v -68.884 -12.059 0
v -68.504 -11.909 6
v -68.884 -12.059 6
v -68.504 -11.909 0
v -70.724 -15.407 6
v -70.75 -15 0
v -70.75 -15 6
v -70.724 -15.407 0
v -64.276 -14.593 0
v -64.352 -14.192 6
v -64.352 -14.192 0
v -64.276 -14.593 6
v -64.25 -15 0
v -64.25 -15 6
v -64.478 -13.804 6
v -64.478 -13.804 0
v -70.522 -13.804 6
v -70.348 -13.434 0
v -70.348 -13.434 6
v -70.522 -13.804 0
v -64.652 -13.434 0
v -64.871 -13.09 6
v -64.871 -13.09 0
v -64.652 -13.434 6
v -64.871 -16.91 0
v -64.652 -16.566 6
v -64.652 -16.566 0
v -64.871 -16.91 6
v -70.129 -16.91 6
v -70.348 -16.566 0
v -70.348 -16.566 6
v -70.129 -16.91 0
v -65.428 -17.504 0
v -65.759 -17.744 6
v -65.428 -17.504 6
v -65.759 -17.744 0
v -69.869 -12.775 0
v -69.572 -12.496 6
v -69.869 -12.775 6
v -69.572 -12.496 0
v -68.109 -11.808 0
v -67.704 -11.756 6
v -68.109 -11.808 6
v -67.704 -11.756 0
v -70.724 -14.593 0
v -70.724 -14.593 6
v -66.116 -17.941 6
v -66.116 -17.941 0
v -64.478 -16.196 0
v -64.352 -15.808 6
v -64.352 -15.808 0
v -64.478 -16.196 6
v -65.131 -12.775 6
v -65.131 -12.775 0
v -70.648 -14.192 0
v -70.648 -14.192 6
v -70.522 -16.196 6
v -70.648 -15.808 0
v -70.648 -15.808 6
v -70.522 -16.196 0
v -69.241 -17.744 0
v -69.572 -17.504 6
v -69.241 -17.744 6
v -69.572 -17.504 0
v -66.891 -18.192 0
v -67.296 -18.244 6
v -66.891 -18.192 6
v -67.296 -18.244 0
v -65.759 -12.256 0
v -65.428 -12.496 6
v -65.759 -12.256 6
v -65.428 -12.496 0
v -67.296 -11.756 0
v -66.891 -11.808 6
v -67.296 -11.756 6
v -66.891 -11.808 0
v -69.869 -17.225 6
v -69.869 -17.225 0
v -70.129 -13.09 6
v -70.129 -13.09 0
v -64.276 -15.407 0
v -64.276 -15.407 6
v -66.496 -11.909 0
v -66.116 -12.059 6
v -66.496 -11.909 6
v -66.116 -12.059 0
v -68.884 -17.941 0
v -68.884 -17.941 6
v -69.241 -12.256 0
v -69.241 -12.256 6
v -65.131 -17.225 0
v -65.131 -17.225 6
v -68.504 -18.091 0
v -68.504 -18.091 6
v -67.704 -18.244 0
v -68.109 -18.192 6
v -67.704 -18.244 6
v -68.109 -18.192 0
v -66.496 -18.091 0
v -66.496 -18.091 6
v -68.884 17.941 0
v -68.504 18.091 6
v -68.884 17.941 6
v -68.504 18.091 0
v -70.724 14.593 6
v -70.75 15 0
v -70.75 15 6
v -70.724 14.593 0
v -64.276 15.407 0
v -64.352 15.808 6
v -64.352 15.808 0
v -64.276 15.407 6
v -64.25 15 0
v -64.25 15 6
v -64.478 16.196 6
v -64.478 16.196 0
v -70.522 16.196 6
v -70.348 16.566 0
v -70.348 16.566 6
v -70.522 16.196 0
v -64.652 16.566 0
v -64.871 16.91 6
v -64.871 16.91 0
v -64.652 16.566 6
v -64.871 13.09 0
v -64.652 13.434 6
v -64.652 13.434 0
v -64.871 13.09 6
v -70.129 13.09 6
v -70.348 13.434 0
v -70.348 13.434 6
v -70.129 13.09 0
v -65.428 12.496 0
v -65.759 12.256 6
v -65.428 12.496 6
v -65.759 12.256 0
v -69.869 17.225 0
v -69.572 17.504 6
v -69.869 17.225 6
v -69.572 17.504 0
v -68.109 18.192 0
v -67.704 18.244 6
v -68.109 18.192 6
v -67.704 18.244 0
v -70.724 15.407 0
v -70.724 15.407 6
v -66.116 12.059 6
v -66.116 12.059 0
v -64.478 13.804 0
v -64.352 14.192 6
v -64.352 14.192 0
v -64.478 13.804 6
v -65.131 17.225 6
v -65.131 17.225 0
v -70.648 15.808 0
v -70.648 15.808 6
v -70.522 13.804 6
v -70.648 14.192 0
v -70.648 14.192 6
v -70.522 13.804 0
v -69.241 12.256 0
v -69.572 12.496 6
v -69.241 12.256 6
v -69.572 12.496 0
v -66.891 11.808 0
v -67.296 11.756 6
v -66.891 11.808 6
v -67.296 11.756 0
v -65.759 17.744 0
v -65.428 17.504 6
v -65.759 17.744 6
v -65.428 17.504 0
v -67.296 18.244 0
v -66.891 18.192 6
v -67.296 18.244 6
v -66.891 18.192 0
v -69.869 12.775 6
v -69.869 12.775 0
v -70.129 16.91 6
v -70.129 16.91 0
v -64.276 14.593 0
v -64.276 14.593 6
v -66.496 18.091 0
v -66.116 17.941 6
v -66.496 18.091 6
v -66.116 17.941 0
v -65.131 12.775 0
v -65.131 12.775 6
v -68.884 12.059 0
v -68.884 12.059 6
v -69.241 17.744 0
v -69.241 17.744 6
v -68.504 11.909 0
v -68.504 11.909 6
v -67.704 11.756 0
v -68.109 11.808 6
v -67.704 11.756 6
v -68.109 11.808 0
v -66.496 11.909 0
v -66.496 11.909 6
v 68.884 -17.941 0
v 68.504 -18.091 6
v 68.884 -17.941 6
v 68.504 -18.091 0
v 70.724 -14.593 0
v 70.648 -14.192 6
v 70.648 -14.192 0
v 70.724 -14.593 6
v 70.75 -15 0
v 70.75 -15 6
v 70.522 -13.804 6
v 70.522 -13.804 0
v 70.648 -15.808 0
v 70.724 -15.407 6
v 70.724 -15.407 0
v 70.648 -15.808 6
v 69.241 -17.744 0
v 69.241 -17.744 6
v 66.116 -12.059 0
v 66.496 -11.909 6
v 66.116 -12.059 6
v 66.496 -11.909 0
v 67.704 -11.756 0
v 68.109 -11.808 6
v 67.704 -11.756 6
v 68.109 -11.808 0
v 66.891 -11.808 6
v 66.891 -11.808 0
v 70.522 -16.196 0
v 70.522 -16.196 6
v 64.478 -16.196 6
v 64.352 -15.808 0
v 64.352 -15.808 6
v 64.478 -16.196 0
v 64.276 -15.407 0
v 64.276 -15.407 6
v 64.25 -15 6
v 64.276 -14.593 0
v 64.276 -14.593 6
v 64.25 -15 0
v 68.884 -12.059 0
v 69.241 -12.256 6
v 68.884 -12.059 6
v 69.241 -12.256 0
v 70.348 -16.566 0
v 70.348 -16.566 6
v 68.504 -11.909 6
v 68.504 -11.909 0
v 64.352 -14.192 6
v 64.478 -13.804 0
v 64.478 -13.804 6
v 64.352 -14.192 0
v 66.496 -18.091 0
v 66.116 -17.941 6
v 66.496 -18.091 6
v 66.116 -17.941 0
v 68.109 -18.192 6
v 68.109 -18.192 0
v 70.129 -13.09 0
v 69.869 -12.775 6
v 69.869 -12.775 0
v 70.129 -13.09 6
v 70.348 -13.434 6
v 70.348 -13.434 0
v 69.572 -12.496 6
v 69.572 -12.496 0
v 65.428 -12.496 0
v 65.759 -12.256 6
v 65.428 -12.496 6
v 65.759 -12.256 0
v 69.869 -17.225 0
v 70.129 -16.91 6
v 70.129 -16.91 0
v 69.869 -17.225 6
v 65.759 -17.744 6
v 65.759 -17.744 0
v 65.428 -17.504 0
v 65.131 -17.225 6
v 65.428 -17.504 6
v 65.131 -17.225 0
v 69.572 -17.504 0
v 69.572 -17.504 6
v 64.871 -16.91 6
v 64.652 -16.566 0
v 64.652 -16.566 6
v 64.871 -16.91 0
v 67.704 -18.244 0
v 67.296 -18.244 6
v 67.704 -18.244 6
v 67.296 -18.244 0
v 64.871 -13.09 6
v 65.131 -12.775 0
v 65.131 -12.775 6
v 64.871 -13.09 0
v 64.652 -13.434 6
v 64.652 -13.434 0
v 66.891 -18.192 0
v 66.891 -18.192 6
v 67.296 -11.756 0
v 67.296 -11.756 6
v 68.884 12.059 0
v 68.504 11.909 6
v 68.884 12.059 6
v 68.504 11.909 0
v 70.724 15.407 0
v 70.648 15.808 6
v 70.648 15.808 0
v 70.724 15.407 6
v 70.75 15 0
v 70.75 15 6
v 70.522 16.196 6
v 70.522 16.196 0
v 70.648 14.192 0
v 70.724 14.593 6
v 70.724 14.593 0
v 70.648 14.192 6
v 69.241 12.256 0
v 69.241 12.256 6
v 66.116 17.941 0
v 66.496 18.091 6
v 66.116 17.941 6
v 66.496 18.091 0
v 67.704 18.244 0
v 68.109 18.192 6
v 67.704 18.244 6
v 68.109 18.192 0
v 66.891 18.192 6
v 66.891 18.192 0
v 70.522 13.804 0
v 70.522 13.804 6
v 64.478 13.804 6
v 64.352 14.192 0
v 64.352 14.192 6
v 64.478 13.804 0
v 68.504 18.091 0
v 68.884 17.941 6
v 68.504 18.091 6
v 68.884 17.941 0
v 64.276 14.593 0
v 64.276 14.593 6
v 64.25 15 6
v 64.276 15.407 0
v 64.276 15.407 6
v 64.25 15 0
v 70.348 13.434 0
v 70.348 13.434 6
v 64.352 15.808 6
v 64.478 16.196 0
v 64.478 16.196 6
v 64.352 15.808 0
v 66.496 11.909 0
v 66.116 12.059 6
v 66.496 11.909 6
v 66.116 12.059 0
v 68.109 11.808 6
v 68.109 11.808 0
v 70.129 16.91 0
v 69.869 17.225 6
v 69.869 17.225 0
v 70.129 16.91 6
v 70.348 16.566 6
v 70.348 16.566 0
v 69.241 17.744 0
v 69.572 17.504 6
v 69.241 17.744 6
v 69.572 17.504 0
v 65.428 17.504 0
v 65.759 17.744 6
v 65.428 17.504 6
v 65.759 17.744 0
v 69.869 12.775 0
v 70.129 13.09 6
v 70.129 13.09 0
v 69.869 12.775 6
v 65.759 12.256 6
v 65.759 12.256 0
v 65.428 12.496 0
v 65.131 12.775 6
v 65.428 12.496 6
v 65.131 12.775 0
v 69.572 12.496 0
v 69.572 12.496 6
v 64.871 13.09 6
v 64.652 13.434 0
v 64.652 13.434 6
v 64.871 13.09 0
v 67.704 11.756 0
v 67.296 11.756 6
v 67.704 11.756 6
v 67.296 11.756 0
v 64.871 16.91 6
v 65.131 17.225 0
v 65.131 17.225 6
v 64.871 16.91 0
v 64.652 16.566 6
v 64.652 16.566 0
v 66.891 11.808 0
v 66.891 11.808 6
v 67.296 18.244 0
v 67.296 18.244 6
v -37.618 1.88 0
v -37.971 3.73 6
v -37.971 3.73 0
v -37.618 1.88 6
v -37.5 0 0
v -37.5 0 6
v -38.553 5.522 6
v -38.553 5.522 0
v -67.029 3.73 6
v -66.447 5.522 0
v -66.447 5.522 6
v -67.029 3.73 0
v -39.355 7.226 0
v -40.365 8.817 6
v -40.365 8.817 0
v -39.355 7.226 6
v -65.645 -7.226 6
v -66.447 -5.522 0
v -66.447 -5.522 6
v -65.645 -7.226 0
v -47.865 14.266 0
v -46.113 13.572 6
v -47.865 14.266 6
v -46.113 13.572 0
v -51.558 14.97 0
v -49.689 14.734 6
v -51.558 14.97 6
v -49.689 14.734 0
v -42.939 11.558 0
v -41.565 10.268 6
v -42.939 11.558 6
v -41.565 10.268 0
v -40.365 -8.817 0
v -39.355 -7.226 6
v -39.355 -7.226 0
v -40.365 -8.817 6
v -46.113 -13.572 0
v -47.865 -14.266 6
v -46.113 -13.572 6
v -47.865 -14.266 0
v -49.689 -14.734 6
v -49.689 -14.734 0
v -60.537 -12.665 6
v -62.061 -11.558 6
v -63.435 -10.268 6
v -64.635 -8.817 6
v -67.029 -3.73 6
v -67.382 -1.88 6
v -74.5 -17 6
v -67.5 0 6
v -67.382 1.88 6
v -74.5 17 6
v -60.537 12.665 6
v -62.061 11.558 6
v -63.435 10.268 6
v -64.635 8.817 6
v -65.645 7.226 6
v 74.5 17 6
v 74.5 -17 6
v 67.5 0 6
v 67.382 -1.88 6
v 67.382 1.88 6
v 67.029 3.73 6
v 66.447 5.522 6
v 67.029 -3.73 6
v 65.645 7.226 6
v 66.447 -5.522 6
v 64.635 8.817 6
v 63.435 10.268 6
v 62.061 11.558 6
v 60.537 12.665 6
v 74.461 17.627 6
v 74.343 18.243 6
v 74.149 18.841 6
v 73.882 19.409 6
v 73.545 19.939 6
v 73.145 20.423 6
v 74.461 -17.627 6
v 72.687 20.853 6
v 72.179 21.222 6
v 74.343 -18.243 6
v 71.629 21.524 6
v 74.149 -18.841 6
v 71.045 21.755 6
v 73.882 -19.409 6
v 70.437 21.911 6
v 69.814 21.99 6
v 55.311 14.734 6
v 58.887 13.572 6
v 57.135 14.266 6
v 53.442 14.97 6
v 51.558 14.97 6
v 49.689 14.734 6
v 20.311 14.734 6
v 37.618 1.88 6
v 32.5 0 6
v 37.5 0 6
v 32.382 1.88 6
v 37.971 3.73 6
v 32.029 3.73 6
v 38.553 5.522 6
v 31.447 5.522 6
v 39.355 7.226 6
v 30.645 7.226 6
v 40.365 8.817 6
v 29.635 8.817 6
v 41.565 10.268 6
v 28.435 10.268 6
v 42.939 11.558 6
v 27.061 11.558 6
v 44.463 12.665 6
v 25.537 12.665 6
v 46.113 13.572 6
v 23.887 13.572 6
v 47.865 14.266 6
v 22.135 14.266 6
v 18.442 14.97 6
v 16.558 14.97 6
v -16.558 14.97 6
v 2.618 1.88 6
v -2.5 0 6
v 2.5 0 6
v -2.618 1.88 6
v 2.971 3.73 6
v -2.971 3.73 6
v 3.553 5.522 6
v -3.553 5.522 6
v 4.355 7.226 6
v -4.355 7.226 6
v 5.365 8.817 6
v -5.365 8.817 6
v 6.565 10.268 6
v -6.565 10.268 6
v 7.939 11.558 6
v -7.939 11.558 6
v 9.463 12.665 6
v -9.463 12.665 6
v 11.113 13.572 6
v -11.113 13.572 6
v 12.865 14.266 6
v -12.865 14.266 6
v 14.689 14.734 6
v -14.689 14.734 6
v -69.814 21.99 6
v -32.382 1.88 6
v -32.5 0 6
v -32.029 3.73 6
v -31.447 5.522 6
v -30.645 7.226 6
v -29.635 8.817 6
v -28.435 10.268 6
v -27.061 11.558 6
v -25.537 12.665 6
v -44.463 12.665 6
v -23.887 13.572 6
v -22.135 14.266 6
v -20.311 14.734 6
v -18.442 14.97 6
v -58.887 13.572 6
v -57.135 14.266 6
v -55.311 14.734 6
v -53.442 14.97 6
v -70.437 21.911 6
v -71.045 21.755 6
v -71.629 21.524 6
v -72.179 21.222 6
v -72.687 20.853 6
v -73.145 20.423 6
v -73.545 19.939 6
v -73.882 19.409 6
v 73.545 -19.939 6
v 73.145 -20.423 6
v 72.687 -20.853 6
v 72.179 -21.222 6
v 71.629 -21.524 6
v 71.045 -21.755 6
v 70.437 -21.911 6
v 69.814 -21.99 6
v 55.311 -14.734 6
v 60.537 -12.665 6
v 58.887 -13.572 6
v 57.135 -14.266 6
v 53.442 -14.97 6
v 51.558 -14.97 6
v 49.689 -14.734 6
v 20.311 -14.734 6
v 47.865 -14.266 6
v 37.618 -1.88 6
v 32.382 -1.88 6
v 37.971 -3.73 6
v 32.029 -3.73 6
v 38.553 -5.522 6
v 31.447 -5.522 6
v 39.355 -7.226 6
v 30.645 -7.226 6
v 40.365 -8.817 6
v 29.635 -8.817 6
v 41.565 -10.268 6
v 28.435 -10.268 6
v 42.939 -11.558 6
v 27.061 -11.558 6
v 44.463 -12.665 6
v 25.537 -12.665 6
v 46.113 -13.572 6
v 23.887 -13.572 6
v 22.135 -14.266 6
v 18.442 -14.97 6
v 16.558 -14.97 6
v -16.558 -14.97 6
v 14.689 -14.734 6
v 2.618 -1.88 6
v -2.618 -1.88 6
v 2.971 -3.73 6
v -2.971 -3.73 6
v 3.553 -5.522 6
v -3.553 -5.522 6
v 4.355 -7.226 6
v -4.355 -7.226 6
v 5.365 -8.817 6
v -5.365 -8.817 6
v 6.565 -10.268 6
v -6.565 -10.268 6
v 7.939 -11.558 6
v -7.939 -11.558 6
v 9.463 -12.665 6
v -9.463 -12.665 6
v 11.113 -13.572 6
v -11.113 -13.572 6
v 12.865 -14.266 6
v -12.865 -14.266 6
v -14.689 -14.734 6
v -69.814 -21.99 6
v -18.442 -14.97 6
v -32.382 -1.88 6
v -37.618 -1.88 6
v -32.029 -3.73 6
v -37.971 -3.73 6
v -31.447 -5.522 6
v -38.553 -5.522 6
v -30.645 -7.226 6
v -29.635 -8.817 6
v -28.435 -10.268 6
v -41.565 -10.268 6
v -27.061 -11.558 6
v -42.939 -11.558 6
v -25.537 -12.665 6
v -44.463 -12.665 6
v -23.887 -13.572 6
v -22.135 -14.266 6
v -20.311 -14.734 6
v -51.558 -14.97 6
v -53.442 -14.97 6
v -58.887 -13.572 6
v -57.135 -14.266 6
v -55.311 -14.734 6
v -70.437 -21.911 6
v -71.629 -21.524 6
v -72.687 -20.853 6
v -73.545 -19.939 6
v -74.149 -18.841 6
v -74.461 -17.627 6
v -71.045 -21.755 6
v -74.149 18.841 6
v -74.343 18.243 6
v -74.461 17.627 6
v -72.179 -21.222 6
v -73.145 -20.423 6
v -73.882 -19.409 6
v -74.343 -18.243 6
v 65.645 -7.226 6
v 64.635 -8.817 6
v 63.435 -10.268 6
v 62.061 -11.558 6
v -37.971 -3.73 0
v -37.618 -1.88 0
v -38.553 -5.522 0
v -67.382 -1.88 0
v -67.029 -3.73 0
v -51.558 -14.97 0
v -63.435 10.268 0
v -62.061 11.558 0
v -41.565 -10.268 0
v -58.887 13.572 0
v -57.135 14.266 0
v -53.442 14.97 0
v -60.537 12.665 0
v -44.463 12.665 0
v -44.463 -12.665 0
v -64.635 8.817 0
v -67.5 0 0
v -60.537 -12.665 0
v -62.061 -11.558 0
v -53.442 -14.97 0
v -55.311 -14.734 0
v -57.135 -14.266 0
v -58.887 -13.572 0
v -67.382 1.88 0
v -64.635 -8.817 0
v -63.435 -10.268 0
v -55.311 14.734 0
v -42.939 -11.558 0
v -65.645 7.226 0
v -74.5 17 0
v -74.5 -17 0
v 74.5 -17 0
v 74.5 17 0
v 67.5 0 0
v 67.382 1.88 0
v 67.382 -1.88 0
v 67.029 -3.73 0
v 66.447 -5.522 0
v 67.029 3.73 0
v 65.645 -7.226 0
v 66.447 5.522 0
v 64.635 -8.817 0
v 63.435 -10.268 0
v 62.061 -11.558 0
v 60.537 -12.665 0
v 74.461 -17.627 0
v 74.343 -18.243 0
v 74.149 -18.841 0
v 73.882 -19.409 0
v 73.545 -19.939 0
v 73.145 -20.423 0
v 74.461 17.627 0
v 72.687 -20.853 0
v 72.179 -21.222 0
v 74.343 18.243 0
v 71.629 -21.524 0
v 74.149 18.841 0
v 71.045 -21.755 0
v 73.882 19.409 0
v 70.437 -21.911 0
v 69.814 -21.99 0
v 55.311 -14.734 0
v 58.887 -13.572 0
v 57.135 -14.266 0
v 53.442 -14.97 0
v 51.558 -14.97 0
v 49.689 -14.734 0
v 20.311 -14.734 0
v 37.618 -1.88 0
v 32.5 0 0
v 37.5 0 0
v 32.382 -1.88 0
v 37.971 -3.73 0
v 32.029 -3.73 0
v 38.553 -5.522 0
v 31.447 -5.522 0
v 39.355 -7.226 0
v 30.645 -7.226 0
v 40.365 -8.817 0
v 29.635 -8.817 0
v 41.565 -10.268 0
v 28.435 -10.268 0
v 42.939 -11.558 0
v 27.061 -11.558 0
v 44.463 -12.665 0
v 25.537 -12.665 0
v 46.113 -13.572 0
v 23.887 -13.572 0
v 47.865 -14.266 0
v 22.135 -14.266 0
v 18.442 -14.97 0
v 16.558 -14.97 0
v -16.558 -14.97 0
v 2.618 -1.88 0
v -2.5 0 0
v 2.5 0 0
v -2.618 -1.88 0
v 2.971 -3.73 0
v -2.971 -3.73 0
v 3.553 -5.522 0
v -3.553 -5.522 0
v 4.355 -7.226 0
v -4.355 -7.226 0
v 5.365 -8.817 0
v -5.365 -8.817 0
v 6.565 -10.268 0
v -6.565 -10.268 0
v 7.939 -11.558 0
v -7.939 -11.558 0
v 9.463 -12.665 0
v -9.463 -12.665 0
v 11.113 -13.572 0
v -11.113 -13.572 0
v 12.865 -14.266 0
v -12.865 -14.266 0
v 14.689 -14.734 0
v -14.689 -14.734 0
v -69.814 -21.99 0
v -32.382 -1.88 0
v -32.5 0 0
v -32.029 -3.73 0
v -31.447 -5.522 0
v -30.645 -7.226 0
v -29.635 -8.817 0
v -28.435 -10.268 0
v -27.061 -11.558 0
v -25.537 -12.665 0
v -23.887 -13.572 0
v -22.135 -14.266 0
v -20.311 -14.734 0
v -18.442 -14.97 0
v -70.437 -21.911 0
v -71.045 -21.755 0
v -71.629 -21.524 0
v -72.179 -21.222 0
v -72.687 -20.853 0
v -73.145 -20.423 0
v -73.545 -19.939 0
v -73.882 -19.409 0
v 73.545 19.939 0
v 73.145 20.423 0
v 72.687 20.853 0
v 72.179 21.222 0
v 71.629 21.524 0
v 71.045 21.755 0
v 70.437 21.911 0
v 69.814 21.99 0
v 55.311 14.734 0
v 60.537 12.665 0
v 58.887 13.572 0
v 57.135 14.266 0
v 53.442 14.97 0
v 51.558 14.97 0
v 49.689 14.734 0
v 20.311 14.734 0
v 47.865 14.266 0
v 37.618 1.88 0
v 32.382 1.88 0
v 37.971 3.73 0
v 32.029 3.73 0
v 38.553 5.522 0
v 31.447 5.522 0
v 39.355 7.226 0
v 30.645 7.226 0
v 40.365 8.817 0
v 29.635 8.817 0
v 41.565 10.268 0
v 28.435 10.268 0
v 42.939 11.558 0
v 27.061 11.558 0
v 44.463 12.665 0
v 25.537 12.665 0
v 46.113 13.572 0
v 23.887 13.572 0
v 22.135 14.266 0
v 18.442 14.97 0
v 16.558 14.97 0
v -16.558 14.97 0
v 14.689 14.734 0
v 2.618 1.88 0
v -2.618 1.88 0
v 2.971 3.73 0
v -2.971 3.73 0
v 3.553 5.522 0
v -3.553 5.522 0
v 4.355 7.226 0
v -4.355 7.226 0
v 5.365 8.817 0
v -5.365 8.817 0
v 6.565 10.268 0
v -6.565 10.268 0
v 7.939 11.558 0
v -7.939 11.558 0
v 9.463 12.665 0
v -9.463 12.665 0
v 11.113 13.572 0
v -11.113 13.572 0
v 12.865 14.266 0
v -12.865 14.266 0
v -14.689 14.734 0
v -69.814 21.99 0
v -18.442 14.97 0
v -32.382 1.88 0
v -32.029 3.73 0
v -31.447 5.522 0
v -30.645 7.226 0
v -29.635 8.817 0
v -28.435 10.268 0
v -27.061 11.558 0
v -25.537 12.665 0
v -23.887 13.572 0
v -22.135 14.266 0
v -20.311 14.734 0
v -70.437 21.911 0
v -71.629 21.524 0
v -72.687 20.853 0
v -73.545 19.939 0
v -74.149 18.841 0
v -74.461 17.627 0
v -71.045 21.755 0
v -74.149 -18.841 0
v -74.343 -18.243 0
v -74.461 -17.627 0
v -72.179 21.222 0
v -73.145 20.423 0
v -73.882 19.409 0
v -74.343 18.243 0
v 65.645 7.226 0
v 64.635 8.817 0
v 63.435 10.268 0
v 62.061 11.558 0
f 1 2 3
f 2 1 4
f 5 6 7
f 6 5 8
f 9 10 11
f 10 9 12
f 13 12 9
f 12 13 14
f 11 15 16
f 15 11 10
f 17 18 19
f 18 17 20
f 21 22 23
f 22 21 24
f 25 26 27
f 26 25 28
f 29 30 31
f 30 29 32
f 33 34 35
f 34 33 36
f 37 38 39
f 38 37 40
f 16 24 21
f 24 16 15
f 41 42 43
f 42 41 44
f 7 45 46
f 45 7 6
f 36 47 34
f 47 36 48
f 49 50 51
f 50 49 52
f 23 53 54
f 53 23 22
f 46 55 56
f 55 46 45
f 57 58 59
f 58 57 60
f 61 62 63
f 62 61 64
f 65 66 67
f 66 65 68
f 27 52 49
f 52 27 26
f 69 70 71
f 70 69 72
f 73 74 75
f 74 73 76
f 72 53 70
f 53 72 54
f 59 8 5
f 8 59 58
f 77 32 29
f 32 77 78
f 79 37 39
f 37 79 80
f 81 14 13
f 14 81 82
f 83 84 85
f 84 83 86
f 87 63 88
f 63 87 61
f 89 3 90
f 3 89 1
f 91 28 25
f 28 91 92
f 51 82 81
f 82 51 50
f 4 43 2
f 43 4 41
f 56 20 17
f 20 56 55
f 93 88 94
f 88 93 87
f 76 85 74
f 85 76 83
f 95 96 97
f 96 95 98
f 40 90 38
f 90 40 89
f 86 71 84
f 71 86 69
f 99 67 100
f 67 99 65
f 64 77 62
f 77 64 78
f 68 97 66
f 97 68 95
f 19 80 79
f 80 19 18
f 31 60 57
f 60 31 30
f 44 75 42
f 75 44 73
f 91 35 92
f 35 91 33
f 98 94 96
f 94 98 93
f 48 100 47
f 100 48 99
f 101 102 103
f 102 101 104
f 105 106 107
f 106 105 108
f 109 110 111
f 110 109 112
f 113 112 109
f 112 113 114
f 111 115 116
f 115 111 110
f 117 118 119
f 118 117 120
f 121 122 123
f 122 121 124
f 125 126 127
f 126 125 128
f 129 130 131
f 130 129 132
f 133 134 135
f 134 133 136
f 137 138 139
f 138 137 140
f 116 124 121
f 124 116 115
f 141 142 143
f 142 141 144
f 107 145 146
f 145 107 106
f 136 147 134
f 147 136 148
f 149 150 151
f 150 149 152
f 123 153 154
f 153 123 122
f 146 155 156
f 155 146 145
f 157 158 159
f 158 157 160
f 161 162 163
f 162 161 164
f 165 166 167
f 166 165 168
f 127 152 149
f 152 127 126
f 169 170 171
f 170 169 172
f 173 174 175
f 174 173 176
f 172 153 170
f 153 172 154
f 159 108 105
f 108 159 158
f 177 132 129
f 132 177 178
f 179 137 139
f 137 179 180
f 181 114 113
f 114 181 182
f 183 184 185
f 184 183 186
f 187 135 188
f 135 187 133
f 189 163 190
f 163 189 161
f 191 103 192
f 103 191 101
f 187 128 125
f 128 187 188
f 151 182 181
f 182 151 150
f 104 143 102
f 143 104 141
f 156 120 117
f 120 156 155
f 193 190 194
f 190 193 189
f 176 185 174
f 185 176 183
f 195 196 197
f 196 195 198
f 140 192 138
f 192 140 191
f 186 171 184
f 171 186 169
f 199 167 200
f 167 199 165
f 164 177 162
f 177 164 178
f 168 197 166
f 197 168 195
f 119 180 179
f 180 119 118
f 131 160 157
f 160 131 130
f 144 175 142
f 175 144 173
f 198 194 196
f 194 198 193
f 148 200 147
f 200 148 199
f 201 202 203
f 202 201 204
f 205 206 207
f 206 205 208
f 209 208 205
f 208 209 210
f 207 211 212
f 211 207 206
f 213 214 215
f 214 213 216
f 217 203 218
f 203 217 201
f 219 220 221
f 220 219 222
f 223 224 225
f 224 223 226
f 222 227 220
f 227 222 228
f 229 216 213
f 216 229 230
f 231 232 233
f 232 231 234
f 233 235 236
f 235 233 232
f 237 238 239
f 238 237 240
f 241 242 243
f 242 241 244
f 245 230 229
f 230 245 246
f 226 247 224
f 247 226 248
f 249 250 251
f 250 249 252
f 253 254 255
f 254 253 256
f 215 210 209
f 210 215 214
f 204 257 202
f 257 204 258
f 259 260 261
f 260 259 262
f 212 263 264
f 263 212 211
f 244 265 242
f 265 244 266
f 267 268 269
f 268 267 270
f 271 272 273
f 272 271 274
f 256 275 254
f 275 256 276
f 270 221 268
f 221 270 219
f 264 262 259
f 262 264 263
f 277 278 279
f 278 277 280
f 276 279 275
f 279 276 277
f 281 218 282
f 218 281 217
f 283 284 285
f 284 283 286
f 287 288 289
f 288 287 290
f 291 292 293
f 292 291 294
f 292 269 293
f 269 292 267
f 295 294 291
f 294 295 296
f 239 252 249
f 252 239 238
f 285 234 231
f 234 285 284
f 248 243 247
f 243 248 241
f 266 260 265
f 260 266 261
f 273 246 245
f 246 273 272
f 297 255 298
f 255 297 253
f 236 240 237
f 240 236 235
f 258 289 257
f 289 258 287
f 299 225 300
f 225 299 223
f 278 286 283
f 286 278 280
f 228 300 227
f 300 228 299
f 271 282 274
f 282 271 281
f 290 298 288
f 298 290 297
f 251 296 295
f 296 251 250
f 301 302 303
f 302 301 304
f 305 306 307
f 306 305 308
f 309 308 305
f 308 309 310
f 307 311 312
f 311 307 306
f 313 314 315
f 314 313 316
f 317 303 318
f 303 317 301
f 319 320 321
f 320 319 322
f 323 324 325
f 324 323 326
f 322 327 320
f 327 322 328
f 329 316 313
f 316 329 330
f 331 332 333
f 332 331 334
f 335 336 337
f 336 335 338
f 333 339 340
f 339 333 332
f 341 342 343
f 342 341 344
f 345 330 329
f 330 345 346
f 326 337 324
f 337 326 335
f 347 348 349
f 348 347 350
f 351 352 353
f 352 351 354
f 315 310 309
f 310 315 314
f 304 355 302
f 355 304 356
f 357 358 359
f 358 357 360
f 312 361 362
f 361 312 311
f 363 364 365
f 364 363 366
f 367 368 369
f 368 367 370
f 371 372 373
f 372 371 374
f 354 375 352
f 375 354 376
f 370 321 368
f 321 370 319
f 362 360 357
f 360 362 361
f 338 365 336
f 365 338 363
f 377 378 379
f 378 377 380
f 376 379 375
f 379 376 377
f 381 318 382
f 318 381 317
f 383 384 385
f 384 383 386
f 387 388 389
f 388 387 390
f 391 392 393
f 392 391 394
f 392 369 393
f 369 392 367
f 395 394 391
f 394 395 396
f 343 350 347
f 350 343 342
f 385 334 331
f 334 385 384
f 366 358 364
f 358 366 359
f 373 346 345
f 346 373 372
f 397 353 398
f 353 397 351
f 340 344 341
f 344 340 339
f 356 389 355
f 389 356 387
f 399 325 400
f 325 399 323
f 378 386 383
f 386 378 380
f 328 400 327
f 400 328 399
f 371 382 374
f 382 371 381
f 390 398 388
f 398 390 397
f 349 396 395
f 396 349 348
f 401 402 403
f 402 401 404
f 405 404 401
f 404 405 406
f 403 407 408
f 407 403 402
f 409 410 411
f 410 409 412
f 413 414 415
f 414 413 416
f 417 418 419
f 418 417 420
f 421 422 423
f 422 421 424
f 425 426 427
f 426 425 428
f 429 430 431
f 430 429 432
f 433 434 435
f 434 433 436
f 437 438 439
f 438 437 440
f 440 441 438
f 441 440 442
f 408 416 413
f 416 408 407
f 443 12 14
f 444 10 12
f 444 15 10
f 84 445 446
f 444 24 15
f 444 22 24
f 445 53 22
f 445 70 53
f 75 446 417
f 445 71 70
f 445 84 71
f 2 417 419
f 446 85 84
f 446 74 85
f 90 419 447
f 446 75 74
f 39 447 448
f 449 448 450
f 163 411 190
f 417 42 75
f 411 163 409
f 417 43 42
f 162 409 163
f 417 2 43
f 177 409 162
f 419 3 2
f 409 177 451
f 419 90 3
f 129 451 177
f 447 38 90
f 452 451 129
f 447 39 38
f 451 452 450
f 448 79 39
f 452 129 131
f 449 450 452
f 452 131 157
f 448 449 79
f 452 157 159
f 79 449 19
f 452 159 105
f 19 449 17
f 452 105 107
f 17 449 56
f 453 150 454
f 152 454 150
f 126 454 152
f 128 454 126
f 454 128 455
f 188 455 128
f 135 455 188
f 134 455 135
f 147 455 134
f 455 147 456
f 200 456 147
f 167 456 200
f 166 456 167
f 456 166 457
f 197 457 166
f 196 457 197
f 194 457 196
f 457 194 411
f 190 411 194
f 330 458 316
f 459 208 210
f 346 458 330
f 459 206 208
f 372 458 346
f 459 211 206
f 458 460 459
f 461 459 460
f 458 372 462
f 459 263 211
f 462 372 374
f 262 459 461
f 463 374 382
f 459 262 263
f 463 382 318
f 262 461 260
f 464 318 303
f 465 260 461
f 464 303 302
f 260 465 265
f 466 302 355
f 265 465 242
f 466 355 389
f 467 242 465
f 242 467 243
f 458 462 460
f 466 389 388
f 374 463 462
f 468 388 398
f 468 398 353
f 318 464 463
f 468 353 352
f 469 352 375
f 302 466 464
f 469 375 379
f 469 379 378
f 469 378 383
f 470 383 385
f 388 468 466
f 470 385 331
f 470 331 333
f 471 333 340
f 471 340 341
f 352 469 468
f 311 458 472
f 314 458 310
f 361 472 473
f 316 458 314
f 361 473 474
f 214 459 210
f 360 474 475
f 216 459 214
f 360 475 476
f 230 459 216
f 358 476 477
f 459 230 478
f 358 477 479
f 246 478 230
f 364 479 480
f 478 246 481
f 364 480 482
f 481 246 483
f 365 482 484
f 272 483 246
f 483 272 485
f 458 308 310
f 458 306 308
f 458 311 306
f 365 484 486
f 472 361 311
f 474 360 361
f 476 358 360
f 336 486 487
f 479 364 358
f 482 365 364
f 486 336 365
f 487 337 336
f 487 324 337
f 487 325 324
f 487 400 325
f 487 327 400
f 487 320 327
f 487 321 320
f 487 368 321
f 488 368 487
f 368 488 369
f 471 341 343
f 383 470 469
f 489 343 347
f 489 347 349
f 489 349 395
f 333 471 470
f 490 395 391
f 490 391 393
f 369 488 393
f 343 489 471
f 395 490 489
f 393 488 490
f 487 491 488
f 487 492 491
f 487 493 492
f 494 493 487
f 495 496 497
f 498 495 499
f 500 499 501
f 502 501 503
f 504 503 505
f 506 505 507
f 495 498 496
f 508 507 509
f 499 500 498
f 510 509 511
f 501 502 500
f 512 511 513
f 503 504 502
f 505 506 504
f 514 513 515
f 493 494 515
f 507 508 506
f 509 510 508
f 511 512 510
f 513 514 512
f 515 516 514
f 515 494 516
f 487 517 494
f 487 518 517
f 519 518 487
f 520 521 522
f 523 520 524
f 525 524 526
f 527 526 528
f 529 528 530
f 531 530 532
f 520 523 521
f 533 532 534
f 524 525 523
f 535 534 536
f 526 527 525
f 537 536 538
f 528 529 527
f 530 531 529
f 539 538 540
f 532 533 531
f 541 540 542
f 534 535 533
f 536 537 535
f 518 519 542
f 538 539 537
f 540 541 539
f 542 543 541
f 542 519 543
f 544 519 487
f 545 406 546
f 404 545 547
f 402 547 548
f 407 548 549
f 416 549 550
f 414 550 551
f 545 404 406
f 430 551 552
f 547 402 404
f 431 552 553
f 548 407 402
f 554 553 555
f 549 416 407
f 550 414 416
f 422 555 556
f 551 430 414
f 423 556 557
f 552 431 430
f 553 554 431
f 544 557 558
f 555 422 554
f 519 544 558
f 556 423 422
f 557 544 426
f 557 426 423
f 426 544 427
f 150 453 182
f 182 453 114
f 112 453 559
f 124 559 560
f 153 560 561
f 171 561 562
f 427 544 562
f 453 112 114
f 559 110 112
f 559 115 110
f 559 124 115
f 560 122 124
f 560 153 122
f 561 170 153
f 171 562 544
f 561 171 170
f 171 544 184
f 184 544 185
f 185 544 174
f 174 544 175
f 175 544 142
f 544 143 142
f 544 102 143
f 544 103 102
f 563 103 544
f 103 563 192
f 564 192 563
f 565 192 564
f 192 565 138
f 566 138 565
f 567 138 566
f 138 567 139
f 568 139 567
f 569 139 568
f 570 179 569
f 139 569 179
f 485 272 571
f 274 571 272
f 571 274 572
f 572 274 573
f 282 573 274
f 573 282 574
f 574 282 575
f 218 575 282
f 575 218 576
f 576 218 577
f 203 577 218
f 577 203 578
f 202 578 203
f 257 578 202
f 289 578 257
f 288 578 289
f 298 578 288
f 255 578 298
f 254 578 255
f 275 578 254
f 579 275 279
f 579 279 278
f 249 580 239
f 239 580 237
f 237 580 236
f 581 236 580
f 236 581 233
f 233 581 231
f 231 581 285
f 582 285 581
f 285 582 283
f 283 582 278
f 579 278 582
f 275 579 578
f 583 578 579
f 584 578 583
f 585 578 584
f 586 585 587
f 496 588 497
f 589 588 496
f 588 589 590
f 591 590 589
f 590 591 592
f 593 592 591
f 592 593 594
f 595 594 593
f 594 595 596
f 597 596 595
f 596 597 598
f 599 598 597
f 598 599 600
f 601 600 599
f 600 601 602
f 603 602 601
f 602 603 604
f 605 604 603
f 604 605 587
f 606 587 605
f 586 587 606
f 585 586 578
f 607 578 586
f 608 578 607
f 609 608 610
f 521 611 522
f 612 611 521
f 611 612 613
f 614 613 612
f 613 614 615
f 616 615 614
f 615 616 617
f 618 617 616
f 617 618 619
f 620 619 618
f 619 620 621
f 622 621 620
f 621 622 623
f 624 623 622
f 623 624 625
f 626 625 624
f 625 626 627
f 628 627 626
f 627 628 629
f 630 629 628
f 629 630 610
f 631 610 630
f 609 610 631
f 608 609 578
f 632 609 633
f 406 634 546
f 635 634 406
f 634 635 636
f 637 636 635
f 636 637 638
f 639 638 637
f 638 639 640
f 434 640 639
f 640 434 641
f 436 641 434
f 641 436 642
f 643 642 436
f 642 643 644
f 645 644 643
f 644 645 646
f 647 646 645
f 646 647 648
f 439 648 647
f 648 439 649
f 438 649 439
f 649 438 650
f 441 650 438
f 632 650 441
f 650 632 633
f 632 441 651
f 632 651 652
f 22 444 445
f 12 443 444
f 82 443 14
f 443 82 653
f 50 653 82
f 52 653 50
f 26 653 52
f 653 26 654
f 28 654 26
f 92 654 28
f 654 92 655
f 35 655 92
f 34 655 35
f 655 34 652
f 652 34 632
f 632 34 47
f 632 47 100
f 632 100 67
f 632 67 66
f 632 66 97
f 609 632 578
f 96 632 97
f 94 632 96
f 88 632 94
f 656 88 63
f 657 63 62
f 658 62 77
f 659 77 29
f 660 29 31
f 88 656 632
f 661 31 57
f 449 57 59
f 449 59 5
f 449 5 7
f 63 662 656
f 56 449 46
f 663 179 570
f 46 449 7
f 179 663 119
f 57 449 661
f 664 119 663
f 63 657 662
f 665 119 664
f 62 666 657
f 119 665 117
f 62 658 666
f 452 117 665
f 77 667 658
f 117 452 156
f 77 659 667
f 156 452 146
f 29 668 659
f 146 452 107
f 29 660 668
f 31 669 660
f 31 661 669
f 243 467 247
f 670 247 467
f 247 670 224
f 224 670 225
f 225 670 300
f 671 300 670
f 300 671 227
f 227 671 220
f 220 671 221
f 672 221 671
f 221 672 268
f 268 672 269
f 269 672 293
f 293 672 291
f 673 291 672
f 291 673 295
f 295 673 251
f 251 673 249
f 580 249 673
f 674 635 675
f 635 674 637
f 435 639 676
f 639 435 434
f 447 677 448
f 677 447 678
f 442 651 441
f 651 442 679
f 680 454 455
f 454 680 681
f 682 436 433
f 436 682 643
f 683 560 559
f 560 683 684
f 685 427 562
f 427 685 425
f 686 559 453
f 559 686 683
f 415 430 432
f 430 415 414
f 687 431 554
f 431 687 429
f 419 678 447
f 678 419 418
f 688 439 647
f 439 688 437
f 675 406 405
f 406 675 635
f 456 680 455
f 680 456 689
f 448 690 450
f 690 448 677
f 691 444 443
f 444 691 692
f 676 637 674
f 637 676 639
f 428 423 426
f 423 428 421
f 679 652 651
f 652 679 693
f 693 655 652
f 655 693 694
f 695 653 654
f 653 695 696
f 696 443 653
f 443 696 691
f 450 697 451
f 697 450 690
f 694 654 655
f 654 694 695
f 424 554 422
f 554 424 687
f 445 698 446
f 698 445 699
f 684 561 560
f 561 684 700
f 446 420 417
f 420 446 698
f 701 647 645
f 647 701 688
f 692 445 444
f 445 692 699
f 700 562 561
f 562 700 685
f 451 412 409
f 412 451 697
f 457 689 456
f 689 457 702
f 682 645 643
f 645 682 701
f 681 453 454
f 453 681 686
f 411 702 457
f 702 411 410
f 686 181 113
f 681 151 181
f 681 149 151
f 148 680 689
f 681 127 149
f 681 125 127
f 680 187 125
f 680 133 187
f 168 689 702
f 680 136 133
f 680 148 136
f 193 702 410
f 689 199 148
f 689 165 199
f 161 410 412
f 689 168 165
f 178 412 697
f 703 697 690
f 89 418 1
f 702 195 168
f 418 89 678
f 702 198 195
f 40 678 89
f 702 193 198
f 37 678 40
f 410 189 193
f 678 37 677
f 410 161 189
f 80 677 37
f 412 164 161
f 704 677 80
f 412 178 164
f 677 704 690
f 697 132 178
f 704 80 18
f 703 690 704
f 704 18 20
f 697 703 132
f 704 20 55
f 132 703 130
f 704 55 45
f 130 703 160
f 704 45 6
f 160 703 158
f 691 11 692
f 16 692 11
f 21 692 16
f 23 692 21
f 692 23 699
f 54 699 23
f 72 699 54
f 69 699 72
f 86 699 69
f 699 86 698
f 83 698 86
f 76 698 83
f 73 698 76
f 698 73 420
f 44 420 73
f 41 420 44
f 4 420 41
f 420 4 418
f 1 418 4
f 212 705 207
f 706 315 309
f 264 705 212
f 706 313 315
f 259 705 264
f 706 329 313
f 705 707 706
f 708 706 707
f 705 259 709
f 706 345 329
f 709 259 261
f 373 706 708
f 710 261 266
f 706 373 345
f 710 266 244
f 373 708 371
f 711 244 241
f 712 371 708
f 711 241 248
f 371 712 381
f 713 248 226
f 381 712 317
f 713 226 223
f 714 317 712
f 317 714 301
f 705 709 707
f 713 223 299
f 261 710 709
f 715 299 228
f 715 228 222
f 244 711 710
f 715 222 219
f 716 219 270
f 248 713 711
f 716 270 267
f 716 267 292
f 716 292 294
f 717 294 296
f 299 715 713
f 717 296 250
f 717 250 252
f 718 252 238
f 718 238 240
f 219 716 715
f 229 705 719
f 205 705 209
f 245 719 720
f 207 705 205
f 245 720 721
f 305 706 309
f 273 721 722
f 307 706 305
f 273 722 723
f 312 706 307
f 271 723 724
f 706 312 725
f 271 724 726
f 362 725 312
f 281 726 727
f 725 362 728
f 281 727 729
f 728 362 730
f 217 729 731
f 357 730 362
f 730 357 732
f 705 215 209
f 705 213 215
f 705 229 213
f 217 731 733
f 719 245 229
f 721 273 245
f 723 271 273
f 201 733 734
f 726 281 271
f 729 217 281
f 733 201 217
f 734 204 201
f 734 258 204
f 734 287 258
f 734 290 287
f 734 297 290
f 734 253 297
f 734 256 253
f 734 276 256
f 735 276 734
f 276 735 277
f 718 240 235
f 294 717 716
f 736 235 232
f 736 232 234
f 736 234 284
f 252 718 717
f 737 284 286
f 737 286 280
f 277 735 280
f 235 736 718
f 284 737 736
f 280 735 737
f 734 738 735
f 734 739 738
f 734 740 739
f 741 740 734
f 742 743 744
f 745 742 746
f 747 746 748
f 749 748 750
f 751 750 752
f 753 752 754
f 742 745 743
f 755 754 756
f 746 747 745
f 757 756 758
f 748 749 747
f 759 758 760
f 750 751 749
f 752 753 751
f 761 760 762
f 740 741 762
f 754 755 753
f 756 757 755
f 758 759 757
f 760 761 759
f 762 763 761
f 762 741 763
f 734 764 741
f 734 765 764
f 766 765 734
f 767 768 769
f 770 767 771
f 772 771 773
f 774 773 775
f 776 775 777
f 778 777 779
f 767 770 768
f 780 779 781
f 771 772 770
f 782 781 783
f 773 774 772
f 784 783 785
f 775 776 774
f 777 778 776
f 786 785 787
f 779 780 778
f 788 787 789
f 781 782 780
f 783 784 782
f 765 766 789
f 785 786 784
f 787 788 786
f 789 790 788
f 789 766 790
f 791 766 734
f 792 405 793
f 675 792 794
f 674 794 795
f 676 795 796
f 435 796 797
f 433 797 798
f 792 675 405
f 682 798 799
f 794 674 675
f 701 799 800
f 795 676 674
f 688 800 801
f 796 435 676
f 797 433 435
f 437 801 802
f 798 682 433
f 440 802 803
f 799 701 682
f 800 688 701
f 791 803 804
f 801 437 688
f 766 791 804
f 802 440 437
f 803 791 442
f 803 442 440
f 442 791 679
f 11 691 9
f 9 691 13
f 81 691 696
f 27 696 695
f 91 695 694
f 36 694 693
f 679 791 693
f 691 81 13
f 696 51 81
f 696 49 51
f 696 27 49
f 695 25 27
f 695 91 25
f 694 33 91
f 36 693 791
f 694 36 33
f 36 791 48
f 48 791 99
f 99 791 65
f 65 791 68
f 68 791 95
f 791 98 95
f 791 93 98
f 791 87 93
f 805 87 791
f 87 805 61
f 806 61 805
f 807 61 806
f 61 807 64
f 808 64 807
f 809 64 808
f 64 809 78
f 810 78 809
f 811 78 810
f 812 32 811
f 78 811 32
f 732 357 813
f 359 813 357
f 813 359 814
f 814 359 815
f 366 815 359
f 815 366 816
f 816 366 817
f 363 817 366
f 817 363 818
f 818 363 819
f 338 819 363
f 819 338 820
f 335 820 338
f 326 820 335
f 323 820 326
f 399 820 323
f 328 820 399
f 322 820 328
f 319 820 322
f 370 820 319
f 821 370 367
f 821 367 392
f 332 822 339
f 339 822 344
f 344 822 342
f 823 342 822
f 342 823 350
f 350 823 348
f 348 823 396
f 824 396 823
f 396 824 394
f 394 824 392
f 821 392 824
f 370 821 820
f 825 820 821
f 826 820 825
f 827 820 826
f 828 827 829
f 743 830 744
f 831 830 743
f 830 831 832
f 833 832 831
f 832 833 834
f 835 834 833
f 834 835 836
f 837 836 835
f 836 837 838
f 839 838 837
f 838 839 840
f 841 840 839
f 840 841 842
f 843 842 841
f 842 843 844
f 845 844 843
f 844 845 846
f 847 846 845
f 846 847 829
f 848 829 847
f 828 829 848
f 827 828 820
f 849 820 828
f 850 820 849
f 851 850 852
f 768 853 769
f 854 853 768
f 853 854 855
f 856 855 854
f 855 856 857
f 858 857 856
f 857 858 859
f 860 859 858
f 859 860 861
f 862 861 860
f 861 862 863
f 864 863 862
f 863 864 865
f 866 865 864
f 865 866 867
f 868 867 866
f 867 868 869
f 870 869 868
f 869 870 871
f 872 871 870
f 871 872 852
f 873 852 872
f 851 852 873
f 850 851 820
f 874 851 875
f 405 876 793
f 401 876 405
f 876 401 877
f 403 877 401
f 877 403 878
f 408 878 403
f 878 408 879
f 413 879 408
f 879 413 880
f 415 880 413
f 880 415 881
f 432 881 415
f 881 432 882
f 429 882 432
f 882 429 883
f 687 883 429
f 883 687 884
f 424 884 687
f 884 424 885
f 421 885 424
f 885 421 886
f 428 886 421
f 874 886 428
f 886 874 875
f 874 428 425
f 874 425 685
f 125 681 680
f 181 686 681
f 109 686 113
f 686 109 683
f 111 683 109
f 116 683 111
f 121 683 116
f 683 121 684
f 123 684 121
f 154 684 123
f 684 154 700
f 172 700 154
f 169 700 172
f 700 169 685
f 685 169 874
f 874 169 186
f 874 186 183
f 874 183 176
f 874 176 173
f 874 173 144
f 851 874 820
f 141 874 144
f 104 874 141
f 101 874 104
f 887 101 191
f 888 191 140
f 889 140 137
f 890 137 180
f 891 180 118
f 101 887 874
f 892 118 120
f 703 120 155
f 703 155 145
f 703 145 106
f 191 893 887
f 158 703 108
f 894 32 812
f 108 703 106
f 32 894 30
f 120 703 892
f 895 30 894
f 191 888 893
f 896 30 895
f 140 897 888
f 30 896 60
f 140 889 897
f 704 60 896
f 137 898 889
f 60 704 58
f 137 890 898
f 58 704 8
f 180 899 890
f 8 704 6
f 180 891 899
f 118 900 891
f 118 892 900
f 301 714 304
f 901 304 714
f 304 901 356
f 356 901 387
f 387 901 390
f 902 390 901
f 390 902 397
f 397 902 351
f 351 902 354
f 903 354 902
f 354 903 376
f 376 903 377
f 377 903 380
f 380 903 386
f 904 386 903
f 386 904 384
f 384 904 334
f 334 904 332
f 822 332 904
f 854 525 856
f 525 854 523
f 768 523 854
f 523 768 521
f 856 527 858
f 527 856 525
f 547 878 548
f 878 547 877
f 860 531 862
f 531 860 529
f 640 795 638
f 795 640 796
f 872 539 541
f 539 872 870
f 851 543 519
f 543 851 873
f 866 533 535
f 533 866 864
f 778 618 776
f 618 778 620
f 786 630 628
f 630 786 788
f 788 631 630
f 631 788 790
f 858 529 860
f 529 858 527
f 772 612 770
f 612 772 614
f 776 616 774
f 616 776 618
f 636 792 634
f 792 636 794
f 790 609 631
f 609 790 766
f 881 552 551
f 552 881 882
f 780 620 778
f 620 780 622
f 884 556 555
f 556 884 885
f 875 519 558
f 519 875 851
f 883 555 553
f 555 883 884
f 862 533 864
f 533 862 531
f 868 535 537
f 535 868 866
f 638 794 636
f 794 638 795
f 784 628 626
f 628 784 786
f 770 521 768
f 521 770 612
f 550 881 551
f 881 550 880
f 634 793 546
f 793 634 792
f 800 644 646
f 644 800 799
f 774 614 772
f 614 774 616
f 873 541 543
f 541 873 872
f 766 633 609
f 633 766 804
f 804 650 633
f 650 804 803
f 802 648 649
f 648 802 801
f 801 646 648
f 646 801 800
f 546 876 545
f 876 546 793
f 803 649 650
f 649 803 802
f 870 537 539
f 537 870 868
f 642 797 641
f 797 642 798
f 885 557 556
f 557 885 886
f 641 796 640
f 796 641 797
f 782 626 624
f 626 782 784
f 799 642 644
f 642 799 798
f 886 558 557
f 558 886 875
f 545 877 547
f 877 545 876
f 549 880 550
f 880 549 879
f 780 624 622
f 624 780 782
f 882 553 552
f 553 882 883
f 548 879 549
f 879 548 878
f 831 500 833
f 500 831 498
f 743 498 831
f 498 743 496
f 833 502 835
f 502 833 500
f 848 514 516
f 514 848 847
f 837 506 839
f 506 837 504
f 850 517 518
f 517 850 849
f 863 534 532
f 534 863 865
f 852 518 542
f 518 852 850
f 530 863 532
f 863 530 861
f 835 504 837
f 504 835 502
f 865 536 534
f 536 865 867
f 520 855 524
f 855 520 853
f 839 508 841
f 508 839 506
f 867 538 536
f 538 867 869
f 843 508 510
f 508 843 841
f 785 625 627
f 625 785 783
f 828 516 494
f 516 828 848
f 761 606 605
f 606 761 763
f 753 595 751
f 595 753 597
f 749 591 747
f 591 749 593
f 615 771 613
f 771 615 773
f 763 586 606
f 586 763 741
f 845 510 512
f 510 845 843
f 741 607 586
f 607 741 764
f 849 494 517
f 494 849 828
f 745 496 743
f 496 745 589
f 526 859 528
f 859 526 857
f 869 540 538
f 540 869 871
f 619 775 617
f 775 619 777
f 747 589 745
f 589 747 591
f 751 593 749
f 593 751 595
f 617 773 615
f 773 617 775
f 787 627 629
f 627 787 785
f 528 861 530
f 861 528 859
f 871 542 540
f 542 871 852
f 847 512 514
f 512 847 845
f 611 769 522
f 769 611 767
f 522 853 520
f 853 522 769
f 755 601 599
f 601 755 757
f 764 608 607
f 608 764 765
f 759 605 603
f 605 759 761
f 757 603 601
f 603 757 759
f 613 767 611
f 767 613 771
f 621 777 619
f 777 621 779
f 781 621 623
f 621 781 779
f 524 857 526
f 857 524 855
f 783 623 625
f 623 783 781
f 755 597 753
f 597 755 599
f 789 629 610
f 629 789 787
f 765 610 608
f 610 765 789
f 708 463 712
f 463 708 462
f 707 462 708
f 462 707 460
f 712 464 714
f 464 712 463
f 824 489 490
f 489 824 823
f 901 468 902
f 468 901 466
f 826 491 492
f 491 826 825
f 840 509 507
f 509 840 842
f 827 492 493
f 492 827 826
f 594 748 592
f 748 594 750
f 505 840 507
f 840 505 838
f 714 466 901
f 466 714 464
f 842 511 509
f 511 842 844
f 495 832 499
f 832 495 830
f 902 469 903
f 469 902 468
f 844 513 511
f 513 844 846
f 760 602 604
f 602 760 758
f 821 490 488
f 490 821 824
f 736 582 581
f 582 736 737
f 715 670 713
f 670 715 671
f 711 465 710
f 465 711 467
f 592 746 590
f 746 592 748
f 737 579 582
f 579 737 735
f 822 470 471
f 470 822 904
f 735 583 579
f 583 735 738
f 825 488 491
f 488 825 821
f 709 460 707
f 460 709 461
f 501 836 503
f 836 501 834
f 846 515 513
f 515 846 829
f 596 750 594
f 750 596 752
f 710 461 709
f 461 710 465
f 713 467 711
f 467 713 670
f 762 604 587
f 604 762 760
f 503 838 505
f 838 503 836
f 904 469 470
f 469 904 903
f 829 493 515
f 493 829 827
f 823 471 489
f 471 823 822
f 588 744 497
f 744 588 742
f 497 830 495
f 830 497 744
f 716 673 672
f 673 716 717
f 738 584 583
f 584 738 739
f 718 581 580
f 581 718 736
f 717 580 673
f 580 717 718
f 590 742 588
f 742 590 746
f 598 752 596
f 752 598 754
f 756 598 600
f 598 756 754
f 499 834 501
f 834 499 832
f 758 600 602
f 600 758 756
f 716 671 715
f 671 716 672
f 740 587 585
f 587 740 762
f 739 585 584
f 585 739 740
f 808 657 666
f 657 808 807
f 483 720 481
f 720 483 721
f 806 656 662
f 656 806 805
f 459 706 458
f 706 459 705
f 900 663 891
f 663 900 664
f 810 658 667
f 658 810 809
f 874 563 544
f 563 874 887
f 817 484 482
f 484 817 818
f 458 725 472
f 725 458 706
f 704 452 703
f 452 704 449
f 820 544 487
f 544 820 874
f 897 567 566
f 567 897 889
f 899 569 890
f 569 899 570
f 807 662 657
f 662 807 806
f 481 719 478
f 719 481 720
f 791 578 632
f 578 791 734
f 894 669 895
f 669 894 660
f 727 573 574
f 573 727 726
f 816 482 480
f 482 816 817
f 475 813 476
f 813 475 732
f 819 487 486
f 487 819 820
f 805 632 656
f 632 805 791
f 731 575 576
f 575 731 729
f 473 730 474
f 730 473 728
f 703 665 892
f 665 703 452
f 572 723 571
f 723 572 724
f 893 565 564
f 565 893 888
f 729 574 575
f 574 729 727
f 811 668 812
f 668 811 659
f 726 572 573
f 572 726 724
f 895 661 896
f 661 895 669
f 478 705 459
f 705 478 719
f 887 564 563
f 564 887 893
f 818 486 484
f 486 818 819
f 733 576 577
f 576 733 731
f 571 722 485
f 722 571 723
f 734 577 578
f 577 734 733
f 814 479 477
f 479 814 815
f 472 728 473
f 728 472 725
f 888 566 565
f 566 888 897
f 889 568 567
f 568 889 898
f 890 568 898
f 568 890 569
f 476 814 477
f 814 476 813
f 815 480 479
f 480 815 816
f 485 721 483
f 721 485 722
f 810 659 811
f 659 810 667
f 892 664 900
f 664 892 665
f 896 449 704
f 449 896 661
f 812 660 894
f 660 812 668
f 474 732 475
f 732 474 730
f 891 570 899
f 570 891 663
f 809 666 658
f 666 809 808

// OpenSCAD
$fn = 50;


difference() {
	union() {
		hull() {
			translate(v = [-69.5000000000, 17.0000000000, 0]) {
				cylinder(h = 6, r = 5);
			}
			translate(v = [69.5000000000, 17.0000000000, 0]) {
				cylinder(h = 6, r = 5);
			}
			translate(v = [-69.5000000000, -17.0000000000, 0]) {
				cylinder(h = 6, r = 5);
			}
			translate(v = [69.5000000000, -17.0000000000, 0]) {
				cylinder(h = 6, r = 5);
			}
		}
	}
	union() {
		#translate(v = [-67.5000000000, -15.0000000000, -100.0000000000]) {
			cylinder(h = 200, r = 3.2500000000);
		}
		#translate(v = [-67.5000000000, 15.0000000000, -100.0000000000]) {
			cylinder(h = 200, r = 3.2500000000);
		}
		#translate(v = [67.5000000000, -15.0000000000, -100.0000000000]) {
			cylinder(h = 200, r = 3.2500000000);
		}
		#translate(v = [67.5000000000, 15.0000000000, -100.0000000000]) {
			cylinder(h = 200, r = 3.2500000000);
		}
		#translate(v = [-52.5000000000, 0, 0]) {
			cylinder(h = 6, r = 15.0000000000);
		}
		#translate(v = [-17.5000000000, 0, 0]) {
			cylinder(h = 6, r = 15.0000000000);
		}
		#translate(v = [17.5000000000, 0, 0]) {
			cylinder(h = 6, r = 15.0000000000);
		}
		#translate(v = [52.5000000000, 0, 0]) {
			cylinder(h = 6, r = 15.0000000000);
		}
	}
}
